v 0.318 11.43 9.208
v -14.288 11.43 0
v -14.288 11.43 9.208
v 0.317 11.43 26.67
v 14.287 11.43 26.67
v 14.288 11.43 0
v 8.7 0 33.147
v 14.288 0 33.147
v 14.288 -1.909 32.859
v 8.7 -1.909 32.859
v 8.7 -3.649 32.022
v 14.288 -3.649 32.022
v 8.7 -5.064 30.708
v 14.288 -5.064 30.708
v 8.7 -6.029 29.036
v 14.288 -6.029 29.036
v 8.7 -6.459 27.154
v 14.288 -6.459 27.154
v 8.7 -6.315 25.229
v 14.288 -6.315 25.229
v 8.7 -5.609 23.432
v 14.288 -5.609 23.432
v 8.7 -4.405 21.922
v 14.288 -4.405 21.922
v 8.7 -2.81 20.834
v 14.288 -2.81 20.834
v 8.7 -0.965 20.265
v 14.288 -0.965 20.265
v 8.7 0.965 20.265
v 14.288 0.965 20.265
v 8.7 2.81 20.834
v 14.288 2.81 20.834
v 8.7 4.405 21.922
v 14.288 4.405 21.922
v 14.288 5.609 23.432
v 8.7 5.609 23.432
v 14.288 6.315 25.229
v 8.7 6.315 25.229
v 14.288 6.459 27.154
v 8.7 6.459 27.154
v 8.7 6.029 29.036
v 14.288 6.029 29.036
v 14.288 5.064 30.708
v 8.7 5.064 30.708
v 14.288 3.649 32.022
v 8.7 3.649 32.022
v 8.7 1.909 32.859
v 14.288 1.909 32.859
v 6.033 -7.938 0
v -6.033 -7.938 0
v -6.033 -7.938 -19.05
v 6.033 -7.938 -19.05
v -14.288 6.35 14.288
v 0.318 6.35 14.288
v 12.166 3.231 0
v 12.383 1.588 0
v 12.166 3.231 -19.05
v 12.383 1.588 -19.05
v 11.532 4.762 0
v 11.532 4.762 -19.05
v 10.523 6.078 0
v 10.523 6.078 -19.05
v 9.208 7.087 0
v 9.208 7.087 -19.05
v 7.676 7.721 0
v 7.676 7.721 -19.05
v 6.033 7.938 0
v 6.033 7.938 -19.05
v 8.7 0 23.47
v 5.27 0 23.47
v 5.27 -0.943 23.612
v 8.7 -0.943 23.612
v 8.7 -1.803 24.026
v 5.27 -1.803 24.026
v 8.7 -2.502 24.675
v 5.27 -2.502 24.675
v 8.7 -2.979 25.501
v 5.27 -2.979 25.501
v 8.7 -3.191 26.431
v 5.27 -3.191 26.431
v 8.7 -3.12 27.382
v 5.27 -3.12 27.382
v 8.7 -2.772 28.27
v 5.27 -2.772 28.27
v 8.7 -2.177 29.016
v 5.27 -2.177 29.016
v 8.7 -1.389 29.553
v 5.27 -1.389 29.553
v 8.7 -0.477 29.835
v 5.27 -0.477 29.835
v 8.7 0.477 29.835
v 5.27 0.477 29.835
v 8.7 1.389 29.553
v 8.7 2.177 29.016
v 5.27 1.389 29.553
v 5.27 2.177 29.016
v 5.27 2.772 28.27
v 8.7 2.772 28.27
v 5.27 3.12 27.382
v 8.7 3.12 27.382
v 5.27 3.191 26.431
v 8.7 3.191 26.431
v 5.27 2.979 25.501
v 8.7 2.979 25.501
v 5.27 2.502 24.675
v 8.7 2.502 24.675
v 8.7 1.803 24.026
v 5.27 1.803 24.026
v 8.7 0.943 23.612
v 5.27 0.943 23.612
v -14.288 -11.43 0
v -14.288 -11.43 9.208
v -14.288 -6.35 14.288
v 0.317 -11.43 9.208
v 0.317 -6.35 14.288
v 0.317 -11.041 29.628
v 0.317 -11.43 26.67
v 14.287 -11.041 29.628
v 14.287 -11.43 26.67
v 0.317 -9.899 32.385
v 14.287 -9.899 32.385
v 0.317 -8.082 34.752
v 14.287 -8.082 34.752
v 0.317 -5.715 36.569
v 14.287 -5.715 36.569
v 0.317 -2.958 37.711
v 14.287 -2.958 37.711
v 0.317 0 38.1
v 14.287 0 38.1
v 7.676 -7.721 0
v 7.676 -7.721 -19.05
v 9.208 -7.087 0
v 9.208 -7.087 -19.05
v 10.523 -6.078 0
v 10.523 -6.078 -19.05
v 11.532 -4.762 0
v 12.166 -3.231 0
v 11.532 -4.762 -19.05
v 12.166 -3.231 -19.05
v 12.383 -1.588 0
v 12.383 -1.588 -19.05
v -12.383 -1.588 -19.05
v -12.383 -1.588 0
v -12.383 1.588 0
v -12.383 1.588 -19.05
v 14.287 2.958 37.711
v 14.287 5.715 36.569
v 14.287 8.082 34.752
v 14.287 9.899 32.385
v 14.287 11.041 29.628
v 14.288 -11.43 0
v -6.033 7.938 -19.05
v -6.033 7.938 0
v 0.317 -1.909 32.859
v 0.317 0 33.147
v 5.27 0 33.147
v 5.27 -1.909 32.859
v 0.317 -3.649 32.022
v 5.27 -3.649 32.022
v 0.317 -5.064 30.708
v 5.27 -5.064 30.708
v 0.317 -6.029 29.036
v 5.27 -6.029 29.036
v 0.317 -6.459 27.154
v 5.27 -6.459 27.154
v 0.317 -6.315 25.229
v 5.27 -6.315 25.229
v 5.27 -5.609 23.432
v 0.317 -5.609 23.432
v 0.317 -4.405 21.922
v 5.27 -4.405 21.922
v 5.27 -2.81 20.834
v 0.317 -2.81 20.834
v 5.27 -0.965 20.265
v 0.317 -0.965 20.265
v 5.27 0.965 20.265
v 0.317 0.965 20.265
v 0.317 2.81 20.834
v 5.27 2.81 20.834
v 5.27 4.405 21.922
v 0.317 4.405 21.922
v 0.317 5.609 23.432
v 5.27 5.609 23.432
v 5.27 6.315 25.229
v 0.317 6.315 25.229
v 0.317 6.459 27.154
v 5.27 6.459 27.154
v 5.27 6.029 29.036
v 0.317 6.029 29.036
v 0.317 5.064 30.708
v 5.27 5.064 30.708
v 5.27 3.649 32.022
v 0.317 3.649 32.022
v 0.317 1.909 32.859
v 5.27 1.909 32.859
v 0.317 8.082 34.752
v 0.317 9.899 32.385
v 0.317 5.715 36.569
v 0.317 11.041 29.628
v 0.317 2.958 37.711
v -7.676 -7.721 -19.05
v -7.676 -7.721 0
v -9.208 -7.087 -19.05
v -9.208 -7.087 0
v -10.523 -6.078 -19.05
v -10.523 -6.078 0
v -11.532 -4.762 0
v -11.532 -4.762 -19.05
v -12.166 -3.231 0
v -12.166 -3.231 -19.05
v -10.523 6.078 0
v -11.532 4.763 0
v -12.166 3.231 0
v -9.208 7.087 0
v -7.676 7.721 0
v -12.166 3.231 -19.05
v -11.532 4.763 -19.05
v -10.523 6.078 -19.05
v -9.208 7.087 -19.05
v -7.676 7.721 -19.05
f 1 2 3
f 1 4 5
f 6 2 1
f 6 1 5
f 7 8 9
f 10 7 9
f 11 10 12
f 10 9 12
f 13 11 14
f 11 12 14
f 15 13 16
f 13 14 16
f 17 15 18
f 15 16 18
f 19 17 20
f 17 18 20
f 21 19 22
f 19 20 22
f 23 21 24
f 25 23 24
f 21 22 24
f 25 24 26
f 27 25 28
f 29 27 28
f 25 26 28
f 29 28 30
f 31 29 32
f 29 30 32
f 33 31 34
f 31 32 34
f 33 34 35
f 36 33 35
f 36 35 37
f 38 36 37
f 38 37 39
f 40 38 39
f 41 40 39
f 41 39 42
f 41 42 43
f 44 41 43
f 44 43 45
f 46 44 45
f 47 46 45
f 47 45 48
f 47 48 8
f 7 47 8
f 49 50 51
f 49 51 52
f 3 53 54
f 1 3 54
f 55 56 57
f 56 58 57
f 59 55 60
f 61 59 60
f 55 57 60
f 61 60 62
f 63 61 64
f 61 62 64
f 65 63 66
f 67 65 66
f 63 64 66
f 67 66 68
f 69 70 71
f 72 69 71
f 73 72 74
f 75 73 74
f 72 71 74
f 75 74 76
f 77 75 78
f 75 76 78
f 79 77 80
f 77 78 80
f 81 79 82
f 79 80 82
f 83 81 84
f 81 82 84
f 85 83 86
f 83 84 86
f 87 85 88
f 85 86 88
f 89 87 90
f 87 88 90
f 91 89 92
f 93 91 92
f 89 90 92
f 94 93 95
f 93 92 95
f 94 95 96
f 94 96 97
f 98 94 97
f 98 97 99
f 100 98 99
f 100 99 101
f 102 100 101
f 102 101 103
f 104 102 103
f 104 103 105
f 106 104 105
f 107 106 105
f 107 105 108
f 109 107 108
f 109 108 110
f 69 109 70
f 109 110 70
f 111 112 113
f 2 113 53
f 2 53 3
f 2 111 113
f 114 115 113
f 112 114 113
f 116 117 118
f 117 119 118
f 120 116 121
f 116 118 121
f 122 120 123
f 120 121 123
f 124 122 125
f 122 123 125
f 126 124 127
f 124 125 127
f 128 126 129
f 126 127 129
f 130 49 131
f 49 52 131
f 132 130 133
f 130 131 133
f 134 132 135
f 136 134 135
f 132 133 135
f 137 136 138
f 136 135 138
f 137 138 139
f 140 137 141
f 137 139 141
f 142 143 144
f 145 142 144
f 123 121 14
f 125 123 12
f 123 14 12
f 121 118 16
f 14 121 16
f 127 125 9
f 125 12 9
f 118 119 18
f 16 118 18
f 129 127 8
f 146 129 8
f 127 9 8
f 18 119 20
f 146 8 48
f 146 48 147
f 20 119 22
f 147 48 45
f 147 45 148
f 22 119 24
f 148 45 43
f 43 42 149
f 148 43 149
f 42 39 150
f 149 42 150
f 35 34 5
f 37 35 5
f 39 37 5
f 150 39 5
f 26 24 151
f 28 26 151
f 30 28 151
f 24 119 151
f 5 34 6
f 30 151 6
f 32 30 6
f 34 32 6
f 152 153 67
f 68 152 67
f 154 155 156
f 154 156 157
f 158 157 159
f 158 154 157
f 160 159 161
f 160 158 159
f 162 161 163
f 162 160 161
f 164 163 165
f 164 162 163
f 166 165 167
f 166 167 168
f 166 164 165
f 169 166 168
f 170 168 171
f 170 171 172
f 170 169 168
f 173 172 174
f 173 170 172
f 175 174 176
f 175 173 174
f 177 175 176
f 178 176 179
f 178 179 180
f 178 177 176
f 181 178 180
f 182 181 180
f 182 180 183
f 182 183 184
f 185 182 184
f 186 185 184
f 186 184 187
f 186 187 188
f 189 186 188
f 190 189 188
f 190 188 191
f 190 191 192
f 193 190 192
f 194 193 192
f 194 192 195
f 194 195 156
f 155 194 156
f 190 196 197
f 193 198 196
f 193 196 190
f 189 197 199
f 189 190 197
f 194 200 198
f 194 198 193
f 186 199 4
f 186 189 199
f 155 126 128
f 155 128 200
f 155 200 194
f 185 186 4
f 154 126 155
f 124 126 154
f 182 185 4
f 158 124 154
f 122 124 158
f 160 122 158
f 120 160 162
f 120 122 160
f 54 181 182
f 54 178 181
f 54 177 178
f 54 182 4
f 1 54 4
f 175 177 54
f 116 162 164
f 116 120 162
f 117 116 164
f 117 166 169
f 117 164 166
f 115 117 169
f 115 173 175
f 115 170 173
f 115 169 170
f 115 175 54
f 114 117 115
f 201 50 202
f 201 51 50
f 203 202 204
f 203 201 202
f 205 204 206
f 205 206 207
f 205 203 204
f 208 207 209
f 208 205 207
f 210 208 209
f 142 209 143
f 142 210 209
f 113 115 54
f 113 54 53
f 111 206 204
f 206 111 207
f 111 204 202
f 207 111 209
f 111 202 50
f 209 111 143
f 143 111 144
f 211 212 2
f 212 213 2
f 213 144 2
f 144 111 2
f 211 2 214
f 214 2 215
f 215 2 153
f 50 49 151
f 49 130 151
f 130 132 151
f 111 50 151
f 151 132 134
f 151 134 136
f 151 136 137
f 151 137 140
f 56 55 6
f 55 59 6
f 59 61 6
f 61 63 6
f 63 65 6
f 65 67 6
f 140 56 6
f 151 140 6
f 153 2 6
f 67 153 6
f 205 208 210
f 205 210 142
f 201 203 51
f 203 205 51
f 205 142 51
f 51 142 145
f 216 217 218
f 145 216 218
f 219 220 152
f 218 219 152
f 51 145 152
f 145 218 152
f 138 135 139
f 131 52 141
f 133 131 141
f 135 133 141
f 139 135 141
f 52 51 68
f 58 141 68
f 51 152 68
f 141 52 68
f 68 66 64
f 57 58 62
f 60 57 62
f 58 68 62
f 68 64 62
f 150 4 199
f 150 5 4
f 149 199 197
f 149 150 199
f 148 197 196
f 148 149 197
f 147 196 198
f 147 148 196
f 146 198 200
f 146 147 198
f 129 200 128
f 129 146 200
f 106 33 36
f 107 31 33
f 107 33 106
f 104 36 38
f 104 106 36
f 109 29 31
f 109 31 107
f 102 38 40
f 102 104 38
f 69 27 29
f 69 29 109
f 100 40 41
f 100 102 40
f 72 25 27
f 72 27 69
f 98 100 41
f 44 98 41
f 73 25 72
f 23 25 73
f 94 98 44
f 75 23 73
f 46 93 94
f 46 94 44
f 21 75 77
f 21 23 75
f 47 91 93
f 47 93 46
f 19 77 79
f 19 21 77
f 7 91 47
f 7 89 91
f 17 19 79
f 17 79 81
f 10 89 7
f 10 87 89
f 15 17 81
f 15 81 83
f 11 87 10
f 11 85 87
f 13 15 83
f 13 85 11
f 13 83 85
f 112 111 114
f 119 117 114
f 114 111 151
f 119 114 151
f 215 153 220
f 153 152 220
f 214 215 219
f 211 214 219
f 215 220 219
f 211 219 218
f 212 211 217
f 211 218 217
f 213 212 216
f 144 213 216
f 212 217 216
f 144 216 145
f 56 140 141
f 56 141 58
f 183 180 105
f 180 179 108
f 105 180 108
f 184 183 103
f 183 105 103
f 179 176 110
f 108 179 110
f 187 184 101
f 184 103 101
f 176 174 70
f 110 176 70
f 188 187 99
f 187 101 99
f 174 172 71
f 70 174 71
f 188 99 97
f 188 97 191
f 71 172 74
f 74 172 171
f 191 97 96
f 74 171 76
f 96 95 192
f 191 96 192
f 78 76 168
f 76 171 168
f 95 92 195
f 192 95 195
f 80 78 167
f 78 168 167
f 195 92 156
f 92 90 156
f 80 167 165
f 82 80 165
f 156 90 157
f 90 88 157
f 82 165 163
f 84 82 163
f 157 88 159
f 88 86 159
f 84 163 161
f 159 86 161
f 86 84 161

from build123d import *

# Parameters (mm, degrees)
SKETCH2_W                                            = 24.765
SKETCH2_H                                            = 15.875
BOSS_EXTRUDE1_DEPTH                                  = 19.05
SKETCH3_W                                            = 28.575
SKETCH3_H                                            = 22.86
BOSS_EXTRUDE2_DEPTH                                  = 38.1
SKETCH4_W                                            = 14.605
SKETCH4_H                                            = 23.8125
CUT_EXTRUDE1_DEPTH                                   = 47.6725
FILLET5_R                                            = 11.43
FILLET3_R                                            = 6.35
CHAMFER1_SIZE                                        = 5.08
CBORE_FOR_1_4_FILLISTER_HEAD_MACHINE_SCR_D           = 6.4008
CBORE_FOR_1_4_FILLISTER_HEAD_MACHINE_SCR_CBORE_D     = 12.954
CBORE_FOR_1_4_FILLISTER_HEAD_MACHINE_SCR_CBORE_DEPTH = 5.588


with BuildPart() as part:
    # Sketch2 → Boss-Extrude1 (new body)
    with BuildSketch(Plane.XY):
        Rectangle(SKETCH2_W, SKETCH2_H)
    extrude(amount=-BOSS_EXTRUDE1_DEPTH)

    # Sketch3 → Boss-Extrude2 (add)
    with BuildSketch(Plane.XY):
        Rectangle(SKETCH3_W, SKETCH3_H)
    extrude(amount=BOSS_EXTRUDE2_DEPTH)

    # Sketch4 → Cut-Extrude1 (cut, through all)
    with BuildSketch(Plane(origin=(0, -11.43, 0), x_dir=(-1, 0, 0), z_dir=(0, -1, 0))):
        with Locations((6.985, -26.19375)):
            Rectangle(SKETCH4_W, SKETCH4_H)
    extrude(amount=-CUT_EXTRUDE1_DEPTH, mode=Mode.SUBTRACT)

    # Fillet5
    fillet5_edges = [part.edges().sort_by_distance(p)[0] for p in [
        (7.3025, -11.43, 38.1),
        (7.3025, 11.43, 38.1),
    ]]
    fillet(fillet5_edges, radius=FILLET5_R - 0.0001)  # a hair under: the kernel refuses the full size

    # Fillet3
    fillet3_edges = [part.edges().sort_by_distance(p)[0] for p in [
        (-12.3825, 7.9375, -9.525),
        (12.3825, 7.9375, -9.525),
        (12.3825, -7.9375, -9.525),
        (-12.3825, -7.9375, -9.525),
    ]]
    fillet(fillet3_edges, radius=FILLET3_R)

    # Chamfer1
    chamfer1_edges = [part.edges().sort_by_distance(p)[0] for p in [
        (-6.985, 11.43, 14.2875),
        (-6.985, -11.43, 14.2875),
    ]]
    chamfer(chamfer1_edges, length=CHAMFER1_SIZE)

    # CBORE for 1/4 Fillister Head Machine Screw1 (through all)
    with Locations(Plane(origin=(14.2875, 0, 26.67), x_dir=(0, 0, 1), z_dir=(1, 0, 0))):
        with Locations((0, 0)):
            cbore_for_1_4_fillister_head_machine_scr = CounterBoreHole(CBORE_FOR_1_4_FILLISTER_HEAD_MACHINE_SCR_D / 2, CBORE_FOR_1_4_FILLISTER_HEAD_MACHINE_SCR_CBORE_D / 2, CBORE_FOR_1_4_FILLISTER_HEAD_MACHINE_SCR_CBORE_DEPTH)

    # Mirror1: CBORE for 1/4 Fillister Head Machine Screw1 across plane
    add(cbore_for_1_4_fillister_head_machine_scr.mirror(Plane(origin=(6.985, 0, 0), x_dir=(0, 0, 1), z_dir=(1, 0, 0))), mode=Mode.SUBTRACT)


solid = part.part
